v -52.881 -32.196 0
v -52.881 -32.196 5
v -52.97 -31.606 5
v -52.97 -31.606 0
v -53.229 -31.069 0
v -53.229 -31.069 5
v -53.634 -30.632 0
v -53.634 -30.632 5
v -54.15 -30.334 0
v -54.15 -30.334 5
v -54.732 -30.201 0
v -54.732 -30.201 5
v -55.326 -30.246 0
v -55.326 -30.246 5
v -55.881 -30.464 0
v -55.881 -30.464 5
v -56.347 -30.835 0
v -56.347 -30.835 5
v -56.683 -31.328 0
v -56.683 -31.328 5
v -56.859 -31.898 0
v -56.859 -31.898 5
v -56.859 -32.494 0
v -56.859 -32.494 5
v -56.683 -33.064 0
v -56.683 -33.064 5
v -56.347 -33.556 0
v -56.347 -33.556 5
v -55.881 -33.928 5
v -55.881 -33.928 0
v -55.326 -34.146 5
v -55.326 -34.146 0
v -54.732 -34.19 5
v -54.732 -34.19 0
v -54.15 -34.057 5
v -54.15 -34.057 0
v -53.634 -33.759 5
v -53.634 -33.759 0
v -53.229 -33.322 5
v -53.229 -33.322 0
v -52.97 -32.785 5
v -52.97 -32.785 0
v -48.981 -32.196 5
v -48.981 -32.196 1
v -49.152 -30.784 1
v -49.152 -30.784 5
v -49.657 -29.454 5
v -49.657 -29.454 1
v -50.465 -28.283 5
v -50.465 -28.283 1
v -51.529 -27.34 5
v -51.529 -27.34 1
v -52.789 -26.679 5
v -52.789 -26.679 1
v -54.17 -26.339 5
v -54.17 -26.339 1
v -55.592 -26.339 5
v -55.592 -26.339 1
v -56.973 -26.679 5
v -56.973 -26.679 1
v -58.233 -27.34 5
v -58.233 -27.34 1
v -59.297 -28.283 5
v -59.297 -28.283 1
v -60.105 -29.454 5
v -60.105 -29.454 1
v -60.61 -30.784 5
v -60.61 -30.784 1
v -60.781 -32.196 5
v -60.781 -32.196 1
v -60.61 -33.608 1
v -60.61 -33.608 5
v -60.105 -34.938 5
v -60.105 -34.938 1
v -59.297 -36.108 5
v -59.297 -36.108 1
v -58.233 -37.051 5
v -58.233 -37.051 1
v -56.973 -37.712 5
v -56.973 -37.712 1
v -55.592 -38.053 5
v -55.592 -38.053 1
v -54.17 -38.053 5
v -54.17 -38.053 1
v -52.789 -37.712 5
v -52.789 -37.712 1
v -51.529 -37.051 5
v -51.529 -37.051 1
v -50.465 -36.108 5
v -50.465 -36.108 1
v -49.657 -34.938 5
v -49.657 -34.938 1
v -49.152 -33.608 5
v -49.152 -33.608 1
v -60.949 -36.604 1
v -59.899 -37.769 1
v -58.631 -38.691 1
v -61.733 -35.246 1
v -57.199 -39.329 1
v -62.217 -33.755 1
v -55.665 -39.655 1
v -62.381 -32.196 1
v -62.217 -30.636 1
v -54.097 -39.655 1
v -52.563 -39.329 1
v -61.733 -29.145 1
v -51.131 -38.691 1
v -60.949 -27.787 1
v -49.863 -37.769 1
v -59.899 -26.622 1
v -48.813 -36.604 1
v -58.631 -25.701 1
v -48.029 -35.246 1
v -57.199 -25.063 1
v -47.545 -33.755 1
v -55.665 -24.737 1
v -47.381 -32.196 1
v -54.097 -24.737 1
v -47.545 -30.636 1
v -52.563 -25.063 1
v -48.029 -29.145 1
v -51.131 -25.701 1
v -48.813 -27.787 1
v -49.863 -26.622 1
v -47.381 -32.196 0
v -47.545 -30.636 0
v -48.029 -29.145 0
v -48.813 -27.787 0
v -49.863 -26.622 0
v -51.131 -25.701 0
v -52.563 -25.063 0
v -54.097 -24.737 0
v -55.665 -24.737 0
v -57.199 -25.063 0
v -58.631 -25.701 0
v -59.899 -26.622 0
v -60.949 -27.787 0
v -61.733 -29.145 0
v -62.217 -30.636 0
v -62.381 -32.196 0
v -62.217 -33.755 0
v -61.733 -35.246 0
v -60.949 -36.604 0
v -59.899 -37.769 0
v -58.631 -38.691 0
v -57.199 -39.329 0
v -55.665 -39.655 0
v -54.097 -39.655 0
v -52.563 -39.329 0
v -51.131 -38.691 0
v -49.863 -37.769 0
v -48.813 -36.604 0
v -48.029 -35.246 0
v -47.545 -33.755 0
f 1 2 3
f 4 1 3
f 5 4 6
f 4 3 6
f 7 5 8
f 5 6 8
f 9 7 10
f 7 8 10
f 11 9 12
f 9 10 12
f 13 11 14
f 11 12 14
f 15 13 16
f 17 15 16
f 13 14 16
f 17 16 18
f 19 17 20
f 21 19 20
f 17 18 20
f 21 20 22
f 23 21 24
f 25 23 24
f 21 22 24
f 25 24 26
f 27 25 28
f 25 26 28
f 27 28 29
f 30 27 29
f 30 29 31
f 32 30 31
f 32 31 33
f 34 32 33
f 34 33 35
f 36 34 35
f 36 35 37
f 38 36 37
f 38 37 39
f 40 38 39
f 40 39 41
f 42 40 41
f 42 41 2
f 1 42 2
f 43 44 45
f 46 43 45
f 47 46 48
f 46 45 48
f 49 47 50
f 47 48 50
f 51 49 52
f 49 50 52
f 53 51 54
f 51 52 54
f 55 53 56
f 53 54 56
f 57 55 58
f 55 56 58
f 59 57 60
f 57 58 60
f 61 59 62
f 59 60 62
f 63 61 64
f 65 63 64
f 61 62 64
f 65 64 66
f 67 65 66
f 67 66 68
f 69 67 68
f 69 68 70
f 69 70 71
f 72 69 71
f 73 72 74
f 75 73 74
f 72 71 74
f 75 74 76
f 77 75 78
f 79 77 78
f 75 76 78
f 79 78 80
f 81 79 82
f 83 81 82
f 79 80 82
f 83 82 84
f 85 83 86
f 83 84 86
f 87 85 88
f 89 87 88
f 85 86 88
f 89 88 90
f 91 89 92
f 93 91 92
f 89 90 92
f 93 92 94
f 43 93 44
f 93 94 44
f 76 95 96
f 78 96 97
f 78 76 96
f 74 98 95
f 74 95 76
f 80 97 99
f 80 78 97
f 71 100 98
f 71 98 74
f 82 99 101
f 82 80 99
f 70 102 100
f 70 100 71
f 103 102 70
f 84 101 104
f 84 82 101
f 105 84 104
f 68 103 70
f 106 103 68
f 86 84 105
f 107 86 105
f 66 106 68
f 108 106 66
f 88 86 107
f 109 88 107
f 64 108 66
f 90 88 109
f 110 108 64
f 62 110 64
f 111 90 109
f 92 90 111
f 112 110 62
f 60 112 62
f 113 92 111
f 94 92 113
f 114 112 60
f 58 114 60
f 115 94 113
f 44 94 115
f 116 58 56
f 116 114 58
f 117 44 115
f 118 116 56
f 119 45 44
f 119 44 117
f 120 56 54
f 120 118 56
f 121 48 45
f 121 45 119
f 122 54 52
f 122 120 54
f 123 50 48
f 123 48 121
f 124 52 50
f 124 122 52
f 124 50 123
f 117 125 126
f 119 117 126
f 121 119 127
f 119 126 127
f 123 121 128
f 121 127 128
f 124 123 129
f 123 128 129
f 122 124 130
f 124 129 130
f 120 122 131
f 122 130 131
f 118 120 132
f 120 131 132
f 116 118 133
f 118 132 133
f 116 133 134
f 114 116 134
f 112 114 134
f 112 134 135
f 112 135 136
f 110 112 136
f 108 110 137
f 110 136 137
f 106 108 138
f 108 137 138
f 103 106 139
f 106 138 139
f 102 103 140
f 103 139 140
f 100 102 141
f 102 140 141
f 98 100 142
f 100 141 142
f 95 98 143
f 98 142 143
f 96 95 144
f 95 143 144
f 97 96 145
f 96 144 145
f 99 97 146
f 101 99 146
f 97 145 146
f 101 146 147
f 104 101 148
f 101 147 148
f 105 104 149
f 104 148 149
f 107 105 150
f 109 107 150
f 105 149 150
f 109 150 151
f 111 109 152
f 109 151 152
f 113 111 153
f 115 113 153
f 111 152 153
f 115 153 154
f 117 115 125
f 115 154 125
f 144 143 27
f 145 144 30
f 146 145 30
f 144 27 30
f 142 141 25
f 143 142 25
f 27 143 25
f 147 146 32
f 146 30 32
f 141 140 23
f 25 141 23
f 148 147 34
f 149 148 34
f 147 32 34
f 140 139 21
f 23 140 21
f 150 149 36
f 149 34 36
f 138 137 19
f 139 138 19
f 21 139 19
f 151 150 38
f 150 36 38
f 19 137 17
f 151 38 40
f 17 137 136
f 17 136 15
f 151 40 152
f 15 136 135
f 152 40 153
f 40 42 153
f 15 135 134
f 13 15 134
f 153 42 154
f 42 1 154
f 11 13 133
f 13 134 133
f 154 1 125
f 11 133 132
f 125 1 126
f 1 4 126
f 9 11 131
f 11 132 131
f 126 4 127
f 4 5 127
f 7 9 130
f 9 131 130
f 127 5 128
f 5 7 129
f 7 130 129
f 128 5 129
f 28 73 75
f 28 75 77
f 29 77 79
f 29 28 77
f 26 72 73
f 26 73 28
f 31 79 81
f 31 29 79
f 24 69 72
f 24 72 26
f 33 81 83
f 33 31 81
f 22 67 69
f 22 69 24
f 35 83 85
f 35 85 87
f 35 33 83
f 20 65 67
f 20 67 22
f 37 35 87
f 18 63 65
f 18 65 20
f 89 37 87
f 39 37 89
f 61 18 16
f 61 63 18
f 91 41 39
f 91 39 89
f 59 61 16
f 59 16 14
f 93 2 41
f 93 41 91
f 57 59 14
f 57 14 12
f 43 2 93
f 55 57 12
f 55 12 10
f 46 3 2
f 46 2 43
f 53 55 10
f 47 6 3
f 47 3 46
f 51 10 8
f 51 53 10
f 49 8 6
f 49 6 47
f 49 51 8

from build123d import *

# Parameters (mm, degrees)
F0_R     = 7.5
F1_DEPTH = 1
F2_R     = 5.9
F3_DEPTH = 4
F4_R     = 2
F5_DEPTH = 25


with BuildPart() as f1:
    # F0 (on Top) → F1 (new body)
    with BuildSketch(Plane.XY):
        with Locations((-54.880984, -32.195751)):
            Circle(F0_R)
    extrude(amount=F1_DEPTH)

    # F2 (on face) → F3 (join)
    with BuildSketch(Plane.XY.offset(1)):
        with Locations((-54.880984, -32.195751)):
            Circle(F2_R)
    extrude(amount=F3_DEPTH)

    # F4 (on face) → F5 (cut)
    with BuildSketch(Plane.XY.offset(5)):
        with Locations((-54.880984, -32.195751)):
            Circle(F4_R)
    extrude(amount=-F5_DEPTH, mode=Mode.SUBTRACT)


solid = f1.part
